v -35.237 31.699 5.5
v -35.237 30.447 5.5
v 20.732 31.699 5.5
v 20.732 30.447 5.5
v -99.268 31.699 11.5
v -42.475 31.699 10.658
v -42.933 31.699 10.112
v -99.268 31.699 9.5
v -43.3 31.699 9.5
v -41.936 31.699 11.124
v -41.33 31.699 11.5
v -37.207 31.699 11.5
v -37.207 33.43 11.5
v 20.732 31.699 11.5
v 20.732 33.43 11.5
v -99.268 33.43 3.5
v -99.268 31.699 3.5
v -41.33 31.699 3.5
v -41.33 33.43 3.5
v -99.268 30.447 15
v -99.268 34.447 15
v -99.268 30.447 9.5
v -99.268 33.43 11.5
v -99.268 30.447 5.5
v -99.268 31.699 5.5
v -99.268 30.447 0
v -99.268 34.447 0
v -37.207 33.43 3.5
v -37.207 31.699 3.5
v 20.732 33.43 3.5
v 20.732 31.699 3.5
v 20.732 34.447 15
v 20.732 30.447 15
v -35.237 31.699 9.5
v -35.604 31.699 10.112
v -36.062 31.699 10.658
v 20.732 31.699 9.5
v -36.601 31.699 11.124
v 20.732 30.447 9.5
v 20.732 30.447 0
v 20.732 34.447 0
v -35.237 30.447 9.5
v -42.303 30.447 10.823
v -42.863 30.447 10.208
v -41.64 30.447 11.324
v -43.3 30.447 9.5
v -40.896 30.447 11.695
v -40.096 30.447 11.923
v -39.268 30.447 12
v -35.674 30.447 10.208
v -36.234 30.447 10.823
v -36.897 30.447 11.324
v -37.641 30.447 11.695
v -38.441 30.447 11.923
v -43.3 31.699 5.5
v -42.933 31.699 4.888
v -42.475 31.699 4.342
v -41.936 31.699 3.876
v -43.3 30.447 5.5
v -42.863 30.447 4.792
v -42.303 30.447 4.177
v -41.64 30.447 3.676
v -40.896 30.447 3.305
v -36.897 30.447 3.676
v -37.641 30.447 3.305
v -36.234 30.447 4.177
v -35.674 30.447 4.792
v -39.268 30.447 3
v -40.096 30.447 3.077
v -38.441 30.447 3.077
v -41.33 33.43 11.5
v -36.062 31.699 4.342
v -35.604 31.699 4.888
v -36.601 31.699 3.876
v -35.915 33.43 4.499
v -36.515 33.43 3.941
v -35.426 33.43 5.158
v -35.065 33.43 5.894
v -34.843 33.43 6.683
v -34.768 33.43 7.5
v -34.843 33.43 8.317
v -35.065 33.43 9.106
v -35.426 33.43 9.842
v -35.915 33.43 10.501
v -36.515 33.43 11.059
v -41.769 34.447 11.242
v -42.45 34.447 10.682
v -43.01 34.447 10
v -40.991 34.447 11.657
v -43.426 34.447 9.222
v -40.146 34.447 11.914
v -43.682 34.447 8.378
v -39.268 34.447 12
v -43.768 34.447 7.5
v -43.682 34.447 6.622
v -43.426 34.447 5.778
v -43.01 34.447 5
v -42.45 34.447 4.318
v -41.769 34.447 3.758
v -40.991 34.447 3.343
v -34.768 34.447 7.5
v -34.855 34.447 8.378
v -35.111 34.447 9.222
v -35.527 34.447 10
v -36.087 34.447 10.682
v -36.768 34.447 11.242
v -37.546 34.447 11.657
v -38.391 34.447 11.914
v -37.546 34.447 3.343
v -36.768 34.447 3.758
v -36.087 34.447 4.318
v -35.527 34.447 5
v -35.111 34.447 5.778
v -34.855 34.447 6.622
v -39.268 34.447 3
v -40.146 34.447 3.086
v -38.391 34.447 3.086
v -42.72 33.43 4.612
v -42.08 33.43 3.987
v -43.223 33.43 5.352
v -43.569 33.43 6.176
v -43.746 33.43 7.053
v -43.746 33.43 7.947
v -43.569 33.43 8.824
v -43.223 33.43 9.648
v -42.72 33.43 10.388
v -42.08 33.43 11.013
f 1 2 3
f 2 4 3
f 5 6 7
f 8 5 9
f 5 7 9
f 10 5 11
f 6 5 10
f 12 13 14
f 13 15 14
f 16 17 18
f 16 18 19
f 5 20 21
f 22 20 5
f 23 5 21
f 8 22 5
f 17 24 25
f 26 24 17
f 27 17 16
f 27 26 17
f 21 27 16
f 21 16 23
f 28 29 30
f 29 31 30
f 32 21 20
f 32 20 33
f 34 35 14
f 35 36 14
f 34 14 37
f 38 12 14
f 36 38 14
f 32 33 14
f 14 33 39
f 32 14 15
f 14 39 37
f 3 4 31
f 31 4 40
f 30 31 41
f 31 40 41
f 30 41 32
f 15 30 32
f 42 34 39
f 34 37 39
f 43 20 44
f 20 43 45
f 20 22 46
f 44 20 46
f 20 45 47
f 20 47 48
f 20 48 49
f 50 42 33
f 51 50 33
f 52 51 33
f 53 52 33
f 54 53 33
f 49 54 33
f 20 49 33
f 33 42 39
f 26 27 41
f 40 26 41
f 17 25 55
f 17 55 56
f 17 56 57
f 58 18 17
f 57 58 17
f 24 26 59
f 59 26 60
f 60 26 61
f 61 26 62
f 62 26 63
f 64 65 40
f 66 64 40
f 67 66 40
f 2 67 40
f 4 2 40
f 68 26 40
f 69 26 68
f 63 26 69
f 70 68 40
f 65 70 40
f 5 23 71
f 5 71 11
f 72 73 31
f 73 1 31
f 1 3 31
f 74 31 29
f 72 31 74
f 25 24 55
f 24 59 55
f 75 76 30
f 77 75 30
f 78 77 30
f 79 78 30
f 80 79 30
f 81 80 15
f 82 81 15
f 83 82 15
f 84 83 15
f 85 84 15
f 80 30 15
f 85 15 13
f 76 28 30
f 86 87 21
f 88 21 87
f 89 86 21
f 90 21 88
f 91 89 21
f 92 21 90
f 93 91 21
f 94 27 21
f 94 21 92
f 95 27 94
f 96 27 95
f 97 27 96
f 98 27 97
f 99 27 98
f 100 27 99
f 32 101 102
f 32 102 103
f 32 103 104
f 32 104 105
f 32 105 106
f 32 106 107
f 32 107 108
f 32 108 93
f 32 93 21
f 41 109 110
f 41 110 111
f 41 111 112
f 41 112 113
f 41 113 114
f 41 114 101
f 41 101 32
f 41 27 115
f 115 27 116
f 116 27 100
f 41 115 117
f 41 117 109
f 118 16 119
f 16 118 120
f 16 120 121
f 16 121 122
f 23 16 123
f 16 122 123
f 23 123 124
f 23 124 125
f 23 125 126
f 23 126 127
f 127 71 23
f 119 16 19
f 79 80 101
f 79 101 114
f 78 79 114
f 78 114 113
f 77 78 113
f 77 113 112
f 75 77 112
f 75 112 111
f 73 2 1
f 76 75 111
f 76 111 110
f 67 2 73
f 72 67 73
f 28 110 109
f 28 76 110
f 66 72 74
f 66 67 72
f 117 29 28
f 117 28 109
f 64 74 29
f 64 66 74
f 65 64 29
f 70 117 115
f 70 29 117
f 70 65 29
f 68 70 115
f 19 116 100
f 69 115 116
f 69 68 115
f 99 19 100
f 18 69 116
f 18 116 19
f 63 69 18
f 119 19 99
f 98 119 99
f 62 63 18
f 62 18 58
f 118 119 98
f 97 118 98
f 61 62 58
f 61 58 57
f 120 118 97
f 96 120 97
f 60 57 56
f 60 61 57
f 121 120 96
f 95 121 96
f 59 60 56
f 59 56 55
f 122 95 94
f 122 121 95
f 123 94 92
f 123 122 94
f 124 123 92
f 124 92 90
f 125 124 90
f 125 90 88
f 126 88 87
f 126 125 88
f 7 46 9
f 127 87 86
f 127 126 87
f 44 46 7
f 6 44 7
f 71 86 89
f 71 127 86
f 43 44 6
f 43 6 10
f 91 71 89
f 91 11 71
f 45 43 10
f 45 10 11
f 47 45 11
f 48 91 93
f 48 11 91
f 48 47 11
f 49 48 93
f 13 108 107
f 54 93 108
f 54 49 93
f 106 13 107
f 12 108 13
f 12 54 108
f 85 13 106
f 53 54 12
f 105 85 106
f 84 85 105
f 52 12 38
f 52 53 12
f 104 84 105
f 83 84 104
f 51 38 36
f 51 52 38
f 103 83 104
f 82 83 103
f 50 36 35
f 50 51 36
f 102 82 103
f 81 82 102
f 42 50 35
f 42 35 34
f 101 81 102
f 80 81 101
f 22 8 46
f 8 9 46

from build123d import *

# Parameters (mm, degrees)
SKETCH1_W               = 120
SKETCH1_H               = 4
BOSS_EXTRUDE1_DEPTH     = 15
CUT_EXTRUDE1_DEPTH      = 27
CUT_EXTRUDE1_DEPTH_BACK = 130
SKETCH4_R               = 4.5
CUT_EXTRUDE2_DEPTH      = 44


with BuildPart() as part:
    # Sketch1 → Boss-Extrude1 (new body)
    with BuildSketch(Plane.XY):
        with Locations((-39.26849149, 32.447485816)):
            Rectangle(SKETCH1_W, SKETCH1_H)
    extrude(amount=BOSS_EXTRUDE1_DEPTH)

    # Sketch3 → Cut-Extrude1 (cut, two sides)
    with BuildSketch(Plane(origin=(0, 0, 0), x_dir=(0, 0, -1), z_dir=(1, 0, 0))) as cut_extrude1_sk:
        Polygon((-9.5, 30.447485816), (-5.5, 30.447485816), (-5.5, 31.699233238), (-3.5, 31.699233238), (-3.5, 33.429568038), (-11.5, 33.429568038), (-11.5, 31.699233238), (-9.5, 31.699233238), align=None)
    extrude(amount=CUT_EXTRUDE1_DEPTH, mode=Mode.SUBTRACT)
    extrude(cut_extrude1_sk.sketch, amount=-CUT_EXTRUDE1_DEPTH_BACK, mode=Mode.SUBTRACT)

    # Sketch4 → Cut-Extrude2 (cut)
    with BuildSketch(Plane(origin=(0, 0, 0), x_dir=(1, 0, 0), z_dir=(0, 1, 0))):
        with Locations((-39.26849149, -7.5)):
            Circle(SKETCH4_R)
    extrude(amount=CUT_EXTRUDE2_DEPTH, mode=Mode.SUBTRACT)


solid = part.part
